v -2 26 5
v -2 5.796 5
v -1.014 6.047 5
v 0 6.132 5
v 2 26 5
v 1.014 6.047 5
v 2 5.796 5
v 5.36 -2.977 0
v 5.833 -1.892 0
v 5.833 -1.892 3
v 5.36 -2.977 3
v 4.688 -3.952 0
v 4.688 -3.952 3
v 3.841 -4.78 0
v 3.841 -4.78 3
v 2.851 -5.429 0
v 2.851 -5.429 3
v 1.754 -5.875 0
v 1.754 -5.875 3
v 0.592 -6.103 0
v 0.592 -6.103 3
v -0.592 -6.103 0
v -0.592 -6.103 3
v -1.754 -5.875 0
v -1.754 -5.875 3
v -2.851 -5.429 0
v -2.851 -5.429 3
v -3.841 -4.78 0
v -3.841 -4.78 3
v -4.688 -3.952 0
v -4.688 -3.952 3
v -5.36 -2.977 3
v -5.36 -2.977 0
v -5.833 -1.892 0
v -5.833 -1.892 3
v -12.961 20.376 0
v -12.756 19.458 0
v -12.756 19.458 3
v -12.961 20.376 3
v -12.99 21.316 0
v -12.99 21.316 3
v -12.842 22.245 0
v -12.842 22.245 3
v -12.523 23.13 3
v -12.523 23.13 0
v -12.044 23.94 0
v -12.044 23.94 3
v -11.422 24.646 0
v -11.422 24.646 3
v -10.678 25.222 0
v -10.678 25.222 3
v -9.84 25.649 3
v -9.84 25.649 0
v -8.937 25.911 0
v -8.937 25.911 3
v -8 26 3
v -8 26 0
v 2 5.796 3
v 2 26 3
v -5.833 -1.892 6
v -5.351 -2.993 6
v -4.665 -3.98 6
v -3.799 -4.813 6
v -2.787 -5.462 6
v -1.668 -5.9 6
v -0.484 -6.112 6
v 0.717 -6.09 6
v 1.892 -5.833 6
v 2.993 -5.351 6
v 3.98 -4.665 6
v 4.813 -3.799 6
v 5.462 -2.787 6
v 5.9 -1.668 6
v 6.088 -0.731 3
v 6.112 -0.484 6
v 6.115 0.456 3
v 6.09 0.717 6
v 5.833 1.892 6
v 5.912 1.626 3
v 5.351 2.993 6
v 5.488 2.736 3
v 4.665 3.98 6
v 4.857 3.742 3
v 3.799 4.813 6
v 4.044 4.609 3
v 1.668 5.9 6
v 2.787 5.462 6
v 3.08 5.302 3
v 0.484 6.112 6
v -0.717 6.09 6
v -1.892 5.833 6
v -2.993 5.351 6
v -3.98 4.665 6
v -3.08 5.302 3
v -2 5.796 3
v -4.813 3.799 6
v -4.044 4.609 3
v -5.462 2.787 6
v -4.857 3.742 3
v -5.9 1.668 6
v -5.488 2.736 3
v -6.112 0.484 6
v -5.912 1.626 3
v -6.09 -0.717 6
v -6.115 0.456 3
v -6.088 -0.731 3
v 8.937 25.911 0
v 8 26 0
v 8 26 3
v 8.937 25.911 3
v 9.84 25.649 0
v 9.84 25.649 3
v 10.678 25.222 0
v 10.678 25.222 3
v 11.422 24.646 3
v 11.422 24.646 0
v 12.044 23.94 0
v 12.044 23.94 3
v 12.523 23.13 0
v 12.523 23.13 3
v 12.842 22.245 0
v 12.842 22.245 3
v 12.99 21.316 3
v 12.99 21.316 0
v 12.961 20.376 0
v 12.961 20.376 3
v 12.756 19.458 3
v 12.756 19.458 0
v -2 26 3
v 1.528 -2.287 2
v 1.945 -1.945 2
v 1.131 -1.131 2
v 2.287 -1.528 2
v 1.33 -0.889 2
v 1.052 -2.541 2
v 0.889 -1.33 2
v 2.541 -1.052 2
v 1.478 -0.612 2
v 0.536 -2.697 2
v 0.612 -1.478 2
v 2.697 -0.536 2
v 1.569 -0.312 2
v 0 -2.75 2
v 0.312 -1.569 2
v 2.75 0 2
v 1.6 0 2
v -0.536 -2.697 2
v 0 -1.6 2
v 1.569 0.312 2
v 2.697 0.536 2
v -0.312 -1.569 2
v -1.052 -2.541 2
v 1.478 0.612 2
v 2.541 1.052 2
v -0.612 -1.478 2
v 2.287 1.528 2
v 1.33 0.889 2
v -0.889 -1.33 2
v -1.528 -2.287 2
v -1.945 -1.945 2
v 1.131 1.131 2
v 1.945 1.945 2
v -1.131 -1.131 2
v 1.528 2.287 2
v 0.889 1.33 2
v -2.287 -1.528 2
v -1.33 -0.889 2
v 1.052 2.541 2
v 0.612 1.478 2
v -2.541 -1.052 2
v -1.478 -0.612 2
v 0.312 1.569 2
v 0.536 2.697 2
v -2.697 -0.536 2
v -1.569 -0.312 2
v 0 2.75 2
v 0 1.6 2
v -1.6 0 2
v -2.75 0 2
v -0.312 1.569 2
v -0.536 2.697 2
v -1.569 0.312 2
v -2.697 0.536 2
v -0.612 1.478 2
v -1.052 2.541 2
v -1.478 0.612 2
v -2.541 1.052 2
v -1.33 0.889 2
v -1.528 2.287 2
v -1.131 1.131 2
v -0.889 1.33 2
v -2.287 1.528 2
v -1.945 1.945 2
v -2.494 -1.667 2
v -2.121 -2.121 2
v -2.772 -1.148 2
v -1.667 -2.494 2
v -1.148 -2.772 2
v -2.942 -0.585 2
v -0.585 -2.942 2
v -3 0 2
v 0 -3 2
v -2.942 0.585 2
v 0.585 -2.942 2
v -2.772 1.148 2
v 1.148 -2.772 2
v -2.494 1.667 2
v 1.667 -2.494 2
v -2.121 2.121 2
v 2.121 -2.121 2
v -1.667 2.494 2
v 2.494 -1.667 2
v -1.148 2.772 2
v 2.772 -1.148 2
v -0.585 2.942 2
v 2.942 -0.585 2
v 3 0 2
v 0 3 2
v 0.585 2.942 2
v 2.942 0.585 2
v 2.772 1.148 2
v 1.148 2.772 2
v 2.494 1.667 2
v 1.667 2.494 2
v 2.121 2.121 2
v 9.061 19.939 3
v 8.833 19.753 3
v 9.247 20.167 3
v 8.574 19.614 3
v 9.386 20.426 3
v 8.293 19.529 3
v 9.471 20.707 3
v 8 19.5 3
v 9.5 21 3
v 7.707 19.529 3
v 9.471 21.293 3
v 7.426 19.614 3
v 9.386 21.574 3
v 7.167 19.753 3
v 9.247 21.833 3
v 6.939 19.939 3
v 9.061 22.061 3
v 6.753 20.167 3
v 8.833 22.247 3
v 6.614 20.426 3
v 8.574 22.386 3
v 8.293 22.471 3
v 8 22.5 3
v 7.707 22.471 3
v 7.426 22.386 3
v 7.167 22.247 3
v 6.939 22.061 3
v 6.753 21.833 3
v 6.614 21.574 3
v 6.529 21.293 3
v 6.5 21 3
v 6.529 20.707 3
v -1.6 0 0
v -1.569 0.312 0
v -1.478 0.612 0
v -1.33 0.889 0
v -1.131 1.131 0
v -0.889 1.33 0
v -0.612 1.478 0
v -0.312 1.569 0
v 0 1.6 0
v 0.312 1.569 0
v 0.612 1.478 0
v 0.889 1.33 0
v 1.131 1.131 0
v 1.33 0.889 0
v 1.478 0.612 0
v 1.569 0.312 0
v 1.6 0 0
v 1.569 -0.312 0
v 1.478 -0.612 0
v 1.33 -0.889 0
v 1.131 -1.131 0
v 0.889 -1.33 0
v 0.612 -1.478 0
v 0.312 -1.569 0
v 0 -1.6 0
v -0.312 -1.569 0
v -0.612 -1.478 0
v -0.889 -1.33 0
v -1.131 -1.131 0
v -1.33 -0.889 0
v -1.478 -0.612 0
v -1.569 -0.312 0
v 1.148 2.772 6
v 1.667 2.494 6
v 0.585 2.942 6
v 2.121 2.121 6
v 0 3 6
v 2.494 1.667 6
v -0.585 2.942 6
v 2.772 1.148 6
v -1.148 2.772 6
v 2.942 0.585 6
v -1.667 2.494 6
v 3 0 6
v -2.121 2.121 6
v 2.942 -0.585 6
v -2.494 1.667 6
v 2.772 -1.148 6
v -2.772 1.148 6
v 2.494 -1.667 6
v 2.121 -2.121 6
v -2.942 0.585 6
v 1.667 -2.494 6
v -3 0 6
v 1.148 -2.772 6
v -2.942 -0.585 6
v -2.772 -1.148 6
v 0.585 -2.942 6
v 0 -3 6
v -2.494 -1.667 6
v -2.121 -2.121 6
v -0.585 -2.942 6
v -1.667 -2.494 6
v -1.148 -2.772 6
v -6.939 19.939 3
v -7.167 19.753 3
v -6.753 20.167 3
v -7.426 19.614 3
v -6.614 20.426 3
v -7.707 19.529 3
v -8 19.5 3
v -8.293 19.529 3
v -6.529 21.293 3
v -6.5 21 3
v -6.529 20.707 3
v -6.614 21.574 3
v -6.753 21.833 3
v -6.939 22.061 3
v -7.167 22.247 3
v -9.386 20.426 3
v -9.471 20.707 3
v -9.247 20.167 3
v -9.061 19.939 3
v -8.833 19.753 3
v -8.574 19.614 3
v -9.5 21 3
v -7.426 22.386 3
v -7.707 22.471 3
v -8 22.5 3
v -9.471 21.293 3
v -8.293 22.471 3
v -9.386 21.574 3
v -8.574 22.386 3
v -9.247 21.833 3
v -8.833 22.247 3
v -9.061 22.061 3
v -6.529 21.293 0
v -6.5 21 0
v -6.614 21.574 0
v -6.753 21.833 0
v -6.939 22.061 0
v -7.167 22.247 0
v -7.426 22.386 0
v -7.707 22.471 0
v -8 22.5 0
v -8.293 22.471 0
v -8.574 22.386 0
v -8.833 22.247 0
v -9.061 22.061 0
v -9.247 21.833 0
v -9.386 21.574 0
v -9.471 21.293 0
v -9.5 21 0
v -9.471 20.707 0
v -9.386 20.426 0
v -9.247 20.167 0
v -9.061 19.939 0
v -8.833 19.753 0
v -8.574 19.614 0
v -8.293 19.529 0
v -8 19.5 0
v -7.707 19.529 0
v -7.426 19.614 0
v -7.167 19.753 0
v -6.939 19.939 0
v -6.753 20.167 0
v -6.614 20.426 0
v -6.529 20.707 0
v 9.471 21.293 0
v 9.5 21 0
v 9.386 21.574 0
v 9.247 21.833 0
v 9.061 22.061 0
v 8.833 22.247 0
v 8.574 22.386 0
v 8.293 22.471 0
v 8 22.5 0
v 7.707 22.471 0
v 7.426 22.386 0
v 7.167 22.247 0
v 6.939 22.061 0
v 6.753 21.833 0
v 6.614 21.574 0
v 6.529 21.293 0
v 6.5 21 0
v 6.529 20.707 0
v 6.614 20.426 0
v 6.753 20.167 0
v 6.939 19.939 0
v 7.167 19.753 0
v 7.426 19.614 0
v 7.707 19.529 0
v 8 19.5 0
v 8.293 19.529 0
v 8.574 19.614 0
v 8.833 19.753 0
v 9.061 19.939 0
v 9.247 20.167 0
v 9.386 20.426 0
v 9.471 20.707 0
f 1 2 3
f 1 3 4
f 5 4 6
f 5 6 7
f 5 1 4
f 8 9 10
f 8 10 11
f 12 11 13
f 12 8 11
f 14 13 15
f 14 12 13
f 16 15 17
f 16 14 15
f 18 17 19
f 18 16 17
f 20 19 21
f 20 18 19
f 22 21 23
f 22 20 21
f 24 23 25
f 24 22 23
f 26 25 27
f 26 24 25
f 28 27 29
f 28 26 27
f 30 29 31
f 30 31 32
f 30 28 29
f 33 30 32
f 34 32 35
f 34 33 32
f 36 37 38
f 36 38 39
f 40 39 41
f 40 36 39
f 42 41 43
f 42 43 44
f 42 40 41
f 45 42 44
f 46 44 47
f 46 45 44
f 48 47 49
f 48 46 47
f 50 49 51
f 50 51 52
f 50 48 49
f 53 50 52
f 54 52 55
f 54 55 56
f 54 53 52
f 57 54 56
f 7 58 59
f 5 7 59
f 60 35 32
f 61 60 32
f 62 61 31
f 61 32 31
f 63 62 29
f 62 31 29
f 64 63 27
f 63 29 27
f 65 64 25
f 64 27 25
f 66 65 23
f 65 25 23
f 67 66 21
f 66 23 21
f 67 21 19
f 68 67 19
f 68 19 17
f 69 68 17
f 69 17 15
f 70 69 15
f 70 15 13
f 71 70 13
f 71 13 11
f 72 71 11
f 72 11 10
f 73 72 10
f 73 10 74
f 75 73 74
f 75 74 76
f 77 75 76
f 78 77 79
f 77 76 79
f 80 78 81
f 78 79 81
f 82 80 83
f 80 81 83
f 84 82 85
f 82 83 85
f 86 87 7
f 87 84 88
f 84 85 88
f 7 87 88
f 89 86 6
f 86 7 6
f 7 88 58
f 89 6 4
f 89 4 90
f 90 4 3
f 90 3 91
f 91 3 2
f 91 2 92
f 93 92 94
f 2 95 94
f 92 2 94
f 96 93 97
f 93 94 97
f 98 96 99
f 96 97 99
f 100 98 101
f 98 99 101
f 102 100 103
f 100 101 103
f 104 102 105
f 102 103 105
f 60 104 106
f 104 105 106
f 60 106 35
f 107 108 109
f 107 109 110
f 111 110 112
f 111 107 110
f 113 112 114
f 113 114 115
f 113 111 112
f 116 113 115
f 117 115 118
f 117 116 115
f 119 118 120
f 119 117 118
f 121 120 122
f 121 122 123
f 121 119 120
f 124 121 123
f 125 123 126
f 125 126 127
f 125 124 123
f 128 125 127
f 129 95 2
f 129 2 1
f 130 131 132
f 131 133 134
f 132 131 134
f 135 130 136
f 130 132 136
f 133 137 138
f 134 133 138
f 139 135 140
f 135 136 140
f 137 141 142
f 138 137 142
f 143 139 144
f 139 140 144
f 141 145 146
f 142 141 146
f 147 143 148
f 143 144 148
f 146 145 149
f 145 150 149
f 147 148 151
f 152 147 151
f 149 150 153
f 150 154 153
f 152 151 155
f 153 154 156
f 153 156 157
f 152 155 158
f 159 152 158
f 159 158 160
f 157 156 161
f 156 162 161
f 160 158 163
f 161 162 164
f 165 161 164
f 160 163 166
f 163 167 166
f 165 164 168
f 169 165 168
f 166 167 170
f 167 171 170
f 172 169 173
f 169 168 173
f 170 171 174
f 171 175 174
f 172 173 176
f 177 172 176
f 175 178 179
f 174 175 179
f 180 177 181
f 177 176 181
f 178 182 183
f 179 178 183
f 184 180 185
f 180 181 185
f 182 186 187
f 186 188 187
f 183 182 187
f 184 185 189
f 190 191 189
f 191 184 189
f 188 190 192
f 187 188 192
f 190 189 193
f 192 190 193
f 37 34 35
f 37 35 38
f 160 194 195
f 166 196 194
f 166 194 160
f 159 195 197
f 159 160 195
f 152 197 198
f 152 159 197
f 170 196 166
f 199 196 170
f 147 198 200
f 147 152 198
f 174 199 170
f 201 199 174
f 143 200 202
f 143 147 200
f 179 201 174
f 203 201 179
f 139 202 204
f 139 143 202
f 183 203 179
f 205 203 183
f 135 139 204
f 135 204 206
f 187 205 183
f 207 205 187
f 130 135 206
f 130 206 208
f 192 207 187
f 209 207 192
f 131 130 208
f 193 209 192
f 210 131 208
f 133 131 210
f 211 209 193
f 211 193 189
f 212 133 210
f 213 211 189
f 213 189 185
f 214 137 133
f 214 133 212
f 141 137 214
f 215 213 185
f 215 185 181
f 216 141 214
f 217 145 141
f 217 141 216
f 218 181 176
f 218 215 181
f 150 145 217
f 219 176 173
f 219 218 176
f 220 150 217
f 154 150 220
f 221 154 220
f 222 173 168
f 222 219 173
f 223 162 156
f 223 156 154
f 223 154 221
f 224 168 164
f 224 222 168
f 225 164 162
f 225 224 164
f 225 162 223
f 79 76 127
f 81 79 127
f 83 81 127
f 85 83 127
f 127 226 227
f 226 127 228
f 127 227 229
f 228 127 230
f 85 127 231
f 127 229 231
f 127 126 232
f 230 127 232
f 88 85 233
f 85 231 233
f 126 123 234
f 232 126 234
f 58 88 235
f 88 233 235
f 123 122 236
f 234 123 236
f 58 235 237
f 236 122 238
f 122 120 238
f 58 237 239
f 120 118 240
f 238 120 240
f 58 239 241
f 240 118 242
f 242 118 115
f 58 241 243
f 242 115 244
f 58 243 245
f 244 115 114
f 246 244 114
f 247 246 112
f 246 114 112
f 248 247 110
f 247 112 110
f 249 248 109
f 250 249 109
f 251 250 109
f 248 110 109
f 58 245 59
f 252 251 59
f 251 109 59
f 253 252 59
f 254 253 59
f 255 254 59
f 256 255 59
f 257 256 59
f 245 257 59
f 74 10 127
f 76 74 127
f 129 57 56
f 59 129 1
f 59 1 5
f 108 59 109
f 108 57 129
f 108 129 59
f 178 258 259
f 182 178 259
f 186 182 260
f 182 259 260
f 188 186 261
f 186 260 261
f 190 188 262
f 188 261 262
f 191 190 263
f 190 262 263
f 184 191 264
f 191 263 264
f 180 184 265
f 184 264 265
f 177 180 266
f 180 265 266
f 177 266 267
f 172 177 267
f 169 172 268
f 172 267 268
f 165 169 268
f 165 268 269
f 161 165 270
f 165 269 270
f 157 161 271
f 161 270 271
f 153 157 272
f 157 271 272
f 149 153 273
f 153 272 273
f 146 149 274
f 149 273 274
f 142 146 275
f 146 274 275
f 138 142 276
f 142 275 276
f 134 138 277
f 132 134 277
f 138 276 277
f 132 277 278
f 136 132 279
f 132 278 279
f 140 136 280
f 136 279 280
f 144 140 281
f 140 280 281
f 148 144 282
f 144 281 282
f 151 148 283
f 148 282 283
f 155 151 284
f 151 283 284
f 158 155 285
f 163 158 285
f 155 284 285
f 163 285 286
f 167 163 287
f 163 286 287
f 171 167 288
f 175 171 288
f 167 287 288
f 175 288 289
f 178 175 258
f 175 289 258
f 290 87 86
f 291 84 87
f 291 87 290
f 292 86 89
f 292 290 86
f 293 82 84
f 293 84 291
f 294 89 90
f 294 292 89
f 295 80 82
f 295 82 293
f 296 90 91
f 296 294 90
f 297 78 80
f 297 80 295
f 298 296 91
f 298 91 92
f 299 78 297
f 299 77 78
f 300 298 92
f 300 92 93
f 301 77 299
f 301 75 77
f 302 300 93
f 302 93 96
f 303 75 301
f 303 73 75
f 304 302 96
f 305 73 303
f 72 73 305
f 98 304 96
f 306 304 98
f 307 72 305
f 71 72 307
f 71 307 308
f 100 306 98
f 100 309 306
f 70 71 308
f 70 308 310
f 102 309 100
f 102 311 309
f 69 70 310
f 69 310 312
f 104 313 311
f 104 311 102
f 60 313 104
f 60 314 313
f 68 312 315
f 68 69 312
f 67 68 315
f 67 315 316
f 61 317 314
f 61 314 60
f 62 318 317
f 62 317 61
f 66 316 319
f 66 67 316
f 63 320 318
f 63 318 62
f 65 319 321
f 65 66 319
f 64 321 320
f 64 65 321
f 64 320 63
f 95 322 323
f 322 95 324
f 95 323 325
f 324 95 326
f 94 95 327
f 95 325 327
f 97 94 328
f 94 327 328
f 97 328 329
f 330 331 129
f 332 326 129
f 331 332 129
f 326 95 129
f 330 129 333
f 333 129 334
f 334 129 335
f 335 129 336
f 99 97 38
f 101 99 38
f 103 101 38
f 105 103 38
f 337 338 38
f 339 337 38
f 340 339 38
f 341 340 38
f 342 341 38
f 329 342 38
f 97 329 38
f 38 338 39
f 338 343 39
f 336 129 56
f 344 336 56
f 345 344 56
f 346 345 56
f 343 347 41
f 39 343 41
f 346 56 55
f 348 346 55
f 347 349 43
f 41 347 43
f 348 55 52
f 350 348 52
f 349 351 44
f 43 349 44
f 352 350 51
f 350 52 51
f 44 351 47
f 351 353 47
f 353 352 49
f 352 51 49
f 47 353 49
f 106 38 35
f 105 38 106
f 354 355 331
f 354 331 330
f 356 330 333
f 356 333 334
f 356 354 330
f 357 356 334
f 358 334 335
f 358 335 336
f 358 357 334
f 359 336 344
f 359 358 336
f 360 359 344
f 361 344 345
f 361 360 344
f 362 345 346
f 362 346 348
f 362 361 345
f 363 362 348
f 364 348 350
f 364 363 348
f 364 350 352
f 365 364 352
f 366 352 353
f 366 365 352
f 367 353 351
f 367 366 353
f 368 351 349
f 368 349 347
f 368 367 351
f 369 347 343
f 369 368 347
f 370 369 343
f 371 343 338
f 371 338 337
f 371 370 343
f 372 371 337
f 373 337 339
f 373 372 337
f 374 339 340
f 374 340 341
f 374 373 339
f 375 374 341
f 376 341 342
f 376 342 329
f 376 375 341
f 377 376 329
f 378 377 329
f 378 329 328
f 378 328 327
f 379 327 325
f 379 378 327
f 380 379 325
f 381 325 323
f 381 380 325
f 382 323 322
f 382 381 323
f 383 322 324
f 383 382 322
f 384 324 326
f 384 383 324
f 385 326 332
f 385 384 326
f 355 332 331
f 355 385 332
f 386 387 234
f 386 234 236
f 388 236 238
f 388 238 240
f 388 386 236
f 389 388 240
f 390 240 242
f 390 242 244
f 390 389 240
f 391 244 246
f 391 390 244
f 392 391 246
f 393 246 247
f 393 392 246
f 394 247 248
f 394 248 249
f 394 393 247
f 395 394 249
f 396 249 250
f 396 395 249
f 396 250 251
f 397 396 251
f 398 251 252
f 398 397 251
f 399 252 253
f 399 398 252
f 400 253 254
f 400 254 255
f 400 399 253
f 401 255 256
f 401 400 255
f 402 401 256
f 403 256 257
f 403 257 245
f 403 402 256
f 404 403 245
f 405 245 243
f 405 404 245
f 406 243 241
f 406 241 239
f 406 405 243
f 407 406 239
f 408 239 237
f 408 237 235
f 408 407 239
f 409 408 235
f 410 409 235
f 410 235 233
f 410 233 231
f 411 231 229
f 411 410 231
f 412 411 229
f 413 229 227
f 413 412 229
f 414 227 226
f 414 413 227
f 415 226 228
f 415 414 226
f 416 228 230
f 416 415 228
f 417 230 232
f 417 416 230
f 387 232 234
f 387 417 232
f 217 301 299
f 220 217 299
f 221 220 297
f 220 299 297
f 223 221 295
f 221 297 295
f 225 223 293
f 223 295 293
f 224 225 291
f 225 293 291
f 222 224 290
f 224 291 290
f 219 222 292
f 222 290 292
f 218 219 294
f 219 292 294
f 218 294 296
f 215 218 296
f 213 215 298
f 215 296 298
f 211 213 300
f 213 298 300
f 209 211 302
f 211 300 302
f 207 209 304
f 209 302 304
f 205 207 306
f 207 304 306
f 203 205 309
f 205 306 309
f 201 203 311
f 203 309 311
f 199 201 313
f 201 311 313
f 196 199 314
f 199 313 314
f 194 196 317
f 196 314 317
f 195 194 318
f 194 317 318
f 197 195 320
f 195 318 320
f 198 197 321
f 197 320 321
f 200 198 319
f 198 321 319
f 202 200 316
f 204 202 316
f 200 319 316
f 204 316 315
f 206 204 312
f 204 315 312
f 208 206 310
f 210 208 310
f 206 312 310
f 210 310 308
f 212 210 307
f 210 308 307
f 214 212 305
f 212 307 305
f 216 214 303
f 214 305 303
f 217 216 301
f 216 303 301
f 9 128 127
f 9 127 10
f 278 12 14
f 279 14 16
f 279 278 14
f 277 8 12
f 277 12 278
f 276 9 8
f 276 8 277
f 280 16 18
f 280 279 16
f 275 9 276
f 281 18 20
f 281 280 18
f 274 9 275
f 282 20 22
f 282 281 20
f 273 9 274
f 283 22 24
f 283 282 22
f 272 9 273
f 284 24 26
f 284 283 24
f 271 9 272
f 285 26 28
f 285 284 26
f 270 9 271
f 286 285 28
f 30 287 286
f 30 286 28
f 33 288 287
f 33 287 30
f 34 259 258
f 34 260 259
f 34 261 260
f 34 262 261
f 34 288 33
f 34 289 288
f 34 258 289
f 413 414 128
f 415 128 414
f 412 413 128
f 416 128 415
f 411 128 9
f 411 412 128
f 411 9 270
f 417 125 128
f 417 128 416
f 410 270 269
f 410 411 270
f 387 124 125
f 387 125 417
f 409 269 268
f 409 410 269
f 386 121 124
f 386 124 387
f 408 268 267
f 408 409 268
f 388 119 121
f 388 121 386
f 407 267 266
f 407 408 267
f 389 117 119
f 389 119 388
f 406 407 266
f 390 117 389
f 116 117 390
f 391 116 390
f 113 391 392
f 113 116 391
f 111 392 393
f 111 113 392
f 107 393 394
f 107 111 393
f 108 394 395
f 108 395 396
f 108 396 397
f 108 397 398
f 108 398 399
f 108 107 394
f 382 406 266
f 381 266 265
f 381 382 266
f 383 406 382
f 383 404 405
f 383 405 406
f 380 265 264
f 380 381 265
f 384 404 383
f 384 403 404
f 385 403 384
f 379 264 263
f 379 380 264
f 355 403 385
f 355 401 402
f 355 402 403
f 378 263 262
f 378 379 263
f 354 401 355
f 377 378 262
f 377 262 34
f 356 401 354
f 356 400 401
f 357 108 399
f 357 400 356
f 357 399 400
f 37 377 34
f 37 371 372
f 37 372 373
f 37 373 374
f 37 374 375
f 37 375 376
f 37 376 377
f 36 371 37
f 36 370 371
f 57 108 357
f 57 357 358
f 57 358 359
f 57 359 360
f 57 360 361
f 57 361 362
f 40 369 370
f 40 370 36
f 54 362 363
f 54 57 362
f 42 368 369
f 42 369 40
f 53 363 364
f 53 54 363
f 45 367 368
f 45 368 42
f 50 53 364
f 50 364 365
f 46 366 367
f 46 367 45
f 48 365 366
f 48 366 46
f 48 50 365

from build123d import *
from build123d.topology import SkipClean

# Parameters (mm, degrees)
SZKIC1_R                    = 2.75
SZKIC1_R_2                  = 1.5
DODANIE_WYCI_GNI_CIE1_DEPTH = 3
SZKIC2_R                    = 6.131623165
SZKIC2_R_2                  = 2.75
DODANIE_WYCI_GNI_CIE2_DEPTH = 3
SZKIC3_R                    = 3
SZKIC3_R_2                  = 1.6
DODANIE_WYCI_GNI_CIE3_DEPTH = 2
SZKIC4_W                    = 4
SZKIC4_H                    = 20.653159846
DODANIE_WYCI_GNI_CIE4_DEPTH = 2
SZKIC6_R                    = 3
WYTNIJ_WYCI_GNI_CIE1_DEPTH  = 4


with BuildPart() as part:
    # Szkic1 → Dodanie-wyciągnięcie1 (new body)
    with BuildSketch(Plane.XY):
        with BuildLine():
            Line((-8, 26), (8, 26))
            ThreePointArc((8, 26), (12.044264582, 23.940055101), (12.756144284, 19.457569598))
            Line((12.756144284, 19.457569598), (5.832576894, -1.891520397))
            ThreePointArc((5.832576894, -1.891520397), (0, -6.131623165), (-5.832576894, -1.891520397))
            Line((-5.832576894, -1.891520397), (-12.756144284, 19.457569598))
            ThreePointArc((-12.756144284, 19.457569598), (-12.044264582, 23.940055101), (-8, 26))
        make_face()
        Circle(SZKIC1_R, mode=Mode.SUBTRACT)
        with Locations((8, 21)):
            Circle(SZKIC1_R_2, mode=Mode.SUBTRACT)
        with Locations((-8, 21)):
            Circle(SZKIC1_R_2, mode=Mode.SUBTRACT)
    extrude(amount=DODANIE_WYCI_GNI_CIE1_DEPTH)

    # Szkic2 → Dodanie-wyciągnięcie2 (add)
    with BuildSketch(Plane.XY.offset(3)):
        with Locations(Location((0, 0, 0), (0, 0, 197.968018337))):
            Circle(SZKIC2_R)
        Circle(SZKIC2_R_2, mode=Mode.SUBTRACT)
    extrude(amount=DODANIE_WYCI_GNI_CIE2_DEPTH)

    # Szkic3 → Dodanie-wyciągnięcie3 (add)
    with BuildSketch(Plane(origin=(0, 0, 0), x_dir=(-1, 0, 0), z_dir=(0, 0, -1))):
        Circle(SZKIC3_R)
        Circle(SZKIC3_R_2, mode=Mode.SUBTRACT)
    extrude(amount=-DODANIE_WYCI_GNI_CIE3_DEPTH)

    # Szkic4 → Dodanie-wyciągnięcie4 (add)
    with BuildSketch(Plane.XY.offset(3)):
        with Locations((0, 15.673420077)):
            Rectangle(SZKIC4_W, SZKIC4_H)
    extrude(amount=DODANIE_WYCI_GNI_CIE4_DEPTH)

    # Szkic6 → Wytnij-wyciągnięcie1 (cut)
    with SkipClean():  # the faces are left unmerged after this step: merging them gives an invalid solid
        with BuildSketch(Plane.XY.offset(6)):
            Circle(SZKIC6_R)
        extrude(amount=-WYTNIJ_WYCI_GNI_CIE1_DEPTH, mode=Mode.SUBTRACT)


solid = part.part
